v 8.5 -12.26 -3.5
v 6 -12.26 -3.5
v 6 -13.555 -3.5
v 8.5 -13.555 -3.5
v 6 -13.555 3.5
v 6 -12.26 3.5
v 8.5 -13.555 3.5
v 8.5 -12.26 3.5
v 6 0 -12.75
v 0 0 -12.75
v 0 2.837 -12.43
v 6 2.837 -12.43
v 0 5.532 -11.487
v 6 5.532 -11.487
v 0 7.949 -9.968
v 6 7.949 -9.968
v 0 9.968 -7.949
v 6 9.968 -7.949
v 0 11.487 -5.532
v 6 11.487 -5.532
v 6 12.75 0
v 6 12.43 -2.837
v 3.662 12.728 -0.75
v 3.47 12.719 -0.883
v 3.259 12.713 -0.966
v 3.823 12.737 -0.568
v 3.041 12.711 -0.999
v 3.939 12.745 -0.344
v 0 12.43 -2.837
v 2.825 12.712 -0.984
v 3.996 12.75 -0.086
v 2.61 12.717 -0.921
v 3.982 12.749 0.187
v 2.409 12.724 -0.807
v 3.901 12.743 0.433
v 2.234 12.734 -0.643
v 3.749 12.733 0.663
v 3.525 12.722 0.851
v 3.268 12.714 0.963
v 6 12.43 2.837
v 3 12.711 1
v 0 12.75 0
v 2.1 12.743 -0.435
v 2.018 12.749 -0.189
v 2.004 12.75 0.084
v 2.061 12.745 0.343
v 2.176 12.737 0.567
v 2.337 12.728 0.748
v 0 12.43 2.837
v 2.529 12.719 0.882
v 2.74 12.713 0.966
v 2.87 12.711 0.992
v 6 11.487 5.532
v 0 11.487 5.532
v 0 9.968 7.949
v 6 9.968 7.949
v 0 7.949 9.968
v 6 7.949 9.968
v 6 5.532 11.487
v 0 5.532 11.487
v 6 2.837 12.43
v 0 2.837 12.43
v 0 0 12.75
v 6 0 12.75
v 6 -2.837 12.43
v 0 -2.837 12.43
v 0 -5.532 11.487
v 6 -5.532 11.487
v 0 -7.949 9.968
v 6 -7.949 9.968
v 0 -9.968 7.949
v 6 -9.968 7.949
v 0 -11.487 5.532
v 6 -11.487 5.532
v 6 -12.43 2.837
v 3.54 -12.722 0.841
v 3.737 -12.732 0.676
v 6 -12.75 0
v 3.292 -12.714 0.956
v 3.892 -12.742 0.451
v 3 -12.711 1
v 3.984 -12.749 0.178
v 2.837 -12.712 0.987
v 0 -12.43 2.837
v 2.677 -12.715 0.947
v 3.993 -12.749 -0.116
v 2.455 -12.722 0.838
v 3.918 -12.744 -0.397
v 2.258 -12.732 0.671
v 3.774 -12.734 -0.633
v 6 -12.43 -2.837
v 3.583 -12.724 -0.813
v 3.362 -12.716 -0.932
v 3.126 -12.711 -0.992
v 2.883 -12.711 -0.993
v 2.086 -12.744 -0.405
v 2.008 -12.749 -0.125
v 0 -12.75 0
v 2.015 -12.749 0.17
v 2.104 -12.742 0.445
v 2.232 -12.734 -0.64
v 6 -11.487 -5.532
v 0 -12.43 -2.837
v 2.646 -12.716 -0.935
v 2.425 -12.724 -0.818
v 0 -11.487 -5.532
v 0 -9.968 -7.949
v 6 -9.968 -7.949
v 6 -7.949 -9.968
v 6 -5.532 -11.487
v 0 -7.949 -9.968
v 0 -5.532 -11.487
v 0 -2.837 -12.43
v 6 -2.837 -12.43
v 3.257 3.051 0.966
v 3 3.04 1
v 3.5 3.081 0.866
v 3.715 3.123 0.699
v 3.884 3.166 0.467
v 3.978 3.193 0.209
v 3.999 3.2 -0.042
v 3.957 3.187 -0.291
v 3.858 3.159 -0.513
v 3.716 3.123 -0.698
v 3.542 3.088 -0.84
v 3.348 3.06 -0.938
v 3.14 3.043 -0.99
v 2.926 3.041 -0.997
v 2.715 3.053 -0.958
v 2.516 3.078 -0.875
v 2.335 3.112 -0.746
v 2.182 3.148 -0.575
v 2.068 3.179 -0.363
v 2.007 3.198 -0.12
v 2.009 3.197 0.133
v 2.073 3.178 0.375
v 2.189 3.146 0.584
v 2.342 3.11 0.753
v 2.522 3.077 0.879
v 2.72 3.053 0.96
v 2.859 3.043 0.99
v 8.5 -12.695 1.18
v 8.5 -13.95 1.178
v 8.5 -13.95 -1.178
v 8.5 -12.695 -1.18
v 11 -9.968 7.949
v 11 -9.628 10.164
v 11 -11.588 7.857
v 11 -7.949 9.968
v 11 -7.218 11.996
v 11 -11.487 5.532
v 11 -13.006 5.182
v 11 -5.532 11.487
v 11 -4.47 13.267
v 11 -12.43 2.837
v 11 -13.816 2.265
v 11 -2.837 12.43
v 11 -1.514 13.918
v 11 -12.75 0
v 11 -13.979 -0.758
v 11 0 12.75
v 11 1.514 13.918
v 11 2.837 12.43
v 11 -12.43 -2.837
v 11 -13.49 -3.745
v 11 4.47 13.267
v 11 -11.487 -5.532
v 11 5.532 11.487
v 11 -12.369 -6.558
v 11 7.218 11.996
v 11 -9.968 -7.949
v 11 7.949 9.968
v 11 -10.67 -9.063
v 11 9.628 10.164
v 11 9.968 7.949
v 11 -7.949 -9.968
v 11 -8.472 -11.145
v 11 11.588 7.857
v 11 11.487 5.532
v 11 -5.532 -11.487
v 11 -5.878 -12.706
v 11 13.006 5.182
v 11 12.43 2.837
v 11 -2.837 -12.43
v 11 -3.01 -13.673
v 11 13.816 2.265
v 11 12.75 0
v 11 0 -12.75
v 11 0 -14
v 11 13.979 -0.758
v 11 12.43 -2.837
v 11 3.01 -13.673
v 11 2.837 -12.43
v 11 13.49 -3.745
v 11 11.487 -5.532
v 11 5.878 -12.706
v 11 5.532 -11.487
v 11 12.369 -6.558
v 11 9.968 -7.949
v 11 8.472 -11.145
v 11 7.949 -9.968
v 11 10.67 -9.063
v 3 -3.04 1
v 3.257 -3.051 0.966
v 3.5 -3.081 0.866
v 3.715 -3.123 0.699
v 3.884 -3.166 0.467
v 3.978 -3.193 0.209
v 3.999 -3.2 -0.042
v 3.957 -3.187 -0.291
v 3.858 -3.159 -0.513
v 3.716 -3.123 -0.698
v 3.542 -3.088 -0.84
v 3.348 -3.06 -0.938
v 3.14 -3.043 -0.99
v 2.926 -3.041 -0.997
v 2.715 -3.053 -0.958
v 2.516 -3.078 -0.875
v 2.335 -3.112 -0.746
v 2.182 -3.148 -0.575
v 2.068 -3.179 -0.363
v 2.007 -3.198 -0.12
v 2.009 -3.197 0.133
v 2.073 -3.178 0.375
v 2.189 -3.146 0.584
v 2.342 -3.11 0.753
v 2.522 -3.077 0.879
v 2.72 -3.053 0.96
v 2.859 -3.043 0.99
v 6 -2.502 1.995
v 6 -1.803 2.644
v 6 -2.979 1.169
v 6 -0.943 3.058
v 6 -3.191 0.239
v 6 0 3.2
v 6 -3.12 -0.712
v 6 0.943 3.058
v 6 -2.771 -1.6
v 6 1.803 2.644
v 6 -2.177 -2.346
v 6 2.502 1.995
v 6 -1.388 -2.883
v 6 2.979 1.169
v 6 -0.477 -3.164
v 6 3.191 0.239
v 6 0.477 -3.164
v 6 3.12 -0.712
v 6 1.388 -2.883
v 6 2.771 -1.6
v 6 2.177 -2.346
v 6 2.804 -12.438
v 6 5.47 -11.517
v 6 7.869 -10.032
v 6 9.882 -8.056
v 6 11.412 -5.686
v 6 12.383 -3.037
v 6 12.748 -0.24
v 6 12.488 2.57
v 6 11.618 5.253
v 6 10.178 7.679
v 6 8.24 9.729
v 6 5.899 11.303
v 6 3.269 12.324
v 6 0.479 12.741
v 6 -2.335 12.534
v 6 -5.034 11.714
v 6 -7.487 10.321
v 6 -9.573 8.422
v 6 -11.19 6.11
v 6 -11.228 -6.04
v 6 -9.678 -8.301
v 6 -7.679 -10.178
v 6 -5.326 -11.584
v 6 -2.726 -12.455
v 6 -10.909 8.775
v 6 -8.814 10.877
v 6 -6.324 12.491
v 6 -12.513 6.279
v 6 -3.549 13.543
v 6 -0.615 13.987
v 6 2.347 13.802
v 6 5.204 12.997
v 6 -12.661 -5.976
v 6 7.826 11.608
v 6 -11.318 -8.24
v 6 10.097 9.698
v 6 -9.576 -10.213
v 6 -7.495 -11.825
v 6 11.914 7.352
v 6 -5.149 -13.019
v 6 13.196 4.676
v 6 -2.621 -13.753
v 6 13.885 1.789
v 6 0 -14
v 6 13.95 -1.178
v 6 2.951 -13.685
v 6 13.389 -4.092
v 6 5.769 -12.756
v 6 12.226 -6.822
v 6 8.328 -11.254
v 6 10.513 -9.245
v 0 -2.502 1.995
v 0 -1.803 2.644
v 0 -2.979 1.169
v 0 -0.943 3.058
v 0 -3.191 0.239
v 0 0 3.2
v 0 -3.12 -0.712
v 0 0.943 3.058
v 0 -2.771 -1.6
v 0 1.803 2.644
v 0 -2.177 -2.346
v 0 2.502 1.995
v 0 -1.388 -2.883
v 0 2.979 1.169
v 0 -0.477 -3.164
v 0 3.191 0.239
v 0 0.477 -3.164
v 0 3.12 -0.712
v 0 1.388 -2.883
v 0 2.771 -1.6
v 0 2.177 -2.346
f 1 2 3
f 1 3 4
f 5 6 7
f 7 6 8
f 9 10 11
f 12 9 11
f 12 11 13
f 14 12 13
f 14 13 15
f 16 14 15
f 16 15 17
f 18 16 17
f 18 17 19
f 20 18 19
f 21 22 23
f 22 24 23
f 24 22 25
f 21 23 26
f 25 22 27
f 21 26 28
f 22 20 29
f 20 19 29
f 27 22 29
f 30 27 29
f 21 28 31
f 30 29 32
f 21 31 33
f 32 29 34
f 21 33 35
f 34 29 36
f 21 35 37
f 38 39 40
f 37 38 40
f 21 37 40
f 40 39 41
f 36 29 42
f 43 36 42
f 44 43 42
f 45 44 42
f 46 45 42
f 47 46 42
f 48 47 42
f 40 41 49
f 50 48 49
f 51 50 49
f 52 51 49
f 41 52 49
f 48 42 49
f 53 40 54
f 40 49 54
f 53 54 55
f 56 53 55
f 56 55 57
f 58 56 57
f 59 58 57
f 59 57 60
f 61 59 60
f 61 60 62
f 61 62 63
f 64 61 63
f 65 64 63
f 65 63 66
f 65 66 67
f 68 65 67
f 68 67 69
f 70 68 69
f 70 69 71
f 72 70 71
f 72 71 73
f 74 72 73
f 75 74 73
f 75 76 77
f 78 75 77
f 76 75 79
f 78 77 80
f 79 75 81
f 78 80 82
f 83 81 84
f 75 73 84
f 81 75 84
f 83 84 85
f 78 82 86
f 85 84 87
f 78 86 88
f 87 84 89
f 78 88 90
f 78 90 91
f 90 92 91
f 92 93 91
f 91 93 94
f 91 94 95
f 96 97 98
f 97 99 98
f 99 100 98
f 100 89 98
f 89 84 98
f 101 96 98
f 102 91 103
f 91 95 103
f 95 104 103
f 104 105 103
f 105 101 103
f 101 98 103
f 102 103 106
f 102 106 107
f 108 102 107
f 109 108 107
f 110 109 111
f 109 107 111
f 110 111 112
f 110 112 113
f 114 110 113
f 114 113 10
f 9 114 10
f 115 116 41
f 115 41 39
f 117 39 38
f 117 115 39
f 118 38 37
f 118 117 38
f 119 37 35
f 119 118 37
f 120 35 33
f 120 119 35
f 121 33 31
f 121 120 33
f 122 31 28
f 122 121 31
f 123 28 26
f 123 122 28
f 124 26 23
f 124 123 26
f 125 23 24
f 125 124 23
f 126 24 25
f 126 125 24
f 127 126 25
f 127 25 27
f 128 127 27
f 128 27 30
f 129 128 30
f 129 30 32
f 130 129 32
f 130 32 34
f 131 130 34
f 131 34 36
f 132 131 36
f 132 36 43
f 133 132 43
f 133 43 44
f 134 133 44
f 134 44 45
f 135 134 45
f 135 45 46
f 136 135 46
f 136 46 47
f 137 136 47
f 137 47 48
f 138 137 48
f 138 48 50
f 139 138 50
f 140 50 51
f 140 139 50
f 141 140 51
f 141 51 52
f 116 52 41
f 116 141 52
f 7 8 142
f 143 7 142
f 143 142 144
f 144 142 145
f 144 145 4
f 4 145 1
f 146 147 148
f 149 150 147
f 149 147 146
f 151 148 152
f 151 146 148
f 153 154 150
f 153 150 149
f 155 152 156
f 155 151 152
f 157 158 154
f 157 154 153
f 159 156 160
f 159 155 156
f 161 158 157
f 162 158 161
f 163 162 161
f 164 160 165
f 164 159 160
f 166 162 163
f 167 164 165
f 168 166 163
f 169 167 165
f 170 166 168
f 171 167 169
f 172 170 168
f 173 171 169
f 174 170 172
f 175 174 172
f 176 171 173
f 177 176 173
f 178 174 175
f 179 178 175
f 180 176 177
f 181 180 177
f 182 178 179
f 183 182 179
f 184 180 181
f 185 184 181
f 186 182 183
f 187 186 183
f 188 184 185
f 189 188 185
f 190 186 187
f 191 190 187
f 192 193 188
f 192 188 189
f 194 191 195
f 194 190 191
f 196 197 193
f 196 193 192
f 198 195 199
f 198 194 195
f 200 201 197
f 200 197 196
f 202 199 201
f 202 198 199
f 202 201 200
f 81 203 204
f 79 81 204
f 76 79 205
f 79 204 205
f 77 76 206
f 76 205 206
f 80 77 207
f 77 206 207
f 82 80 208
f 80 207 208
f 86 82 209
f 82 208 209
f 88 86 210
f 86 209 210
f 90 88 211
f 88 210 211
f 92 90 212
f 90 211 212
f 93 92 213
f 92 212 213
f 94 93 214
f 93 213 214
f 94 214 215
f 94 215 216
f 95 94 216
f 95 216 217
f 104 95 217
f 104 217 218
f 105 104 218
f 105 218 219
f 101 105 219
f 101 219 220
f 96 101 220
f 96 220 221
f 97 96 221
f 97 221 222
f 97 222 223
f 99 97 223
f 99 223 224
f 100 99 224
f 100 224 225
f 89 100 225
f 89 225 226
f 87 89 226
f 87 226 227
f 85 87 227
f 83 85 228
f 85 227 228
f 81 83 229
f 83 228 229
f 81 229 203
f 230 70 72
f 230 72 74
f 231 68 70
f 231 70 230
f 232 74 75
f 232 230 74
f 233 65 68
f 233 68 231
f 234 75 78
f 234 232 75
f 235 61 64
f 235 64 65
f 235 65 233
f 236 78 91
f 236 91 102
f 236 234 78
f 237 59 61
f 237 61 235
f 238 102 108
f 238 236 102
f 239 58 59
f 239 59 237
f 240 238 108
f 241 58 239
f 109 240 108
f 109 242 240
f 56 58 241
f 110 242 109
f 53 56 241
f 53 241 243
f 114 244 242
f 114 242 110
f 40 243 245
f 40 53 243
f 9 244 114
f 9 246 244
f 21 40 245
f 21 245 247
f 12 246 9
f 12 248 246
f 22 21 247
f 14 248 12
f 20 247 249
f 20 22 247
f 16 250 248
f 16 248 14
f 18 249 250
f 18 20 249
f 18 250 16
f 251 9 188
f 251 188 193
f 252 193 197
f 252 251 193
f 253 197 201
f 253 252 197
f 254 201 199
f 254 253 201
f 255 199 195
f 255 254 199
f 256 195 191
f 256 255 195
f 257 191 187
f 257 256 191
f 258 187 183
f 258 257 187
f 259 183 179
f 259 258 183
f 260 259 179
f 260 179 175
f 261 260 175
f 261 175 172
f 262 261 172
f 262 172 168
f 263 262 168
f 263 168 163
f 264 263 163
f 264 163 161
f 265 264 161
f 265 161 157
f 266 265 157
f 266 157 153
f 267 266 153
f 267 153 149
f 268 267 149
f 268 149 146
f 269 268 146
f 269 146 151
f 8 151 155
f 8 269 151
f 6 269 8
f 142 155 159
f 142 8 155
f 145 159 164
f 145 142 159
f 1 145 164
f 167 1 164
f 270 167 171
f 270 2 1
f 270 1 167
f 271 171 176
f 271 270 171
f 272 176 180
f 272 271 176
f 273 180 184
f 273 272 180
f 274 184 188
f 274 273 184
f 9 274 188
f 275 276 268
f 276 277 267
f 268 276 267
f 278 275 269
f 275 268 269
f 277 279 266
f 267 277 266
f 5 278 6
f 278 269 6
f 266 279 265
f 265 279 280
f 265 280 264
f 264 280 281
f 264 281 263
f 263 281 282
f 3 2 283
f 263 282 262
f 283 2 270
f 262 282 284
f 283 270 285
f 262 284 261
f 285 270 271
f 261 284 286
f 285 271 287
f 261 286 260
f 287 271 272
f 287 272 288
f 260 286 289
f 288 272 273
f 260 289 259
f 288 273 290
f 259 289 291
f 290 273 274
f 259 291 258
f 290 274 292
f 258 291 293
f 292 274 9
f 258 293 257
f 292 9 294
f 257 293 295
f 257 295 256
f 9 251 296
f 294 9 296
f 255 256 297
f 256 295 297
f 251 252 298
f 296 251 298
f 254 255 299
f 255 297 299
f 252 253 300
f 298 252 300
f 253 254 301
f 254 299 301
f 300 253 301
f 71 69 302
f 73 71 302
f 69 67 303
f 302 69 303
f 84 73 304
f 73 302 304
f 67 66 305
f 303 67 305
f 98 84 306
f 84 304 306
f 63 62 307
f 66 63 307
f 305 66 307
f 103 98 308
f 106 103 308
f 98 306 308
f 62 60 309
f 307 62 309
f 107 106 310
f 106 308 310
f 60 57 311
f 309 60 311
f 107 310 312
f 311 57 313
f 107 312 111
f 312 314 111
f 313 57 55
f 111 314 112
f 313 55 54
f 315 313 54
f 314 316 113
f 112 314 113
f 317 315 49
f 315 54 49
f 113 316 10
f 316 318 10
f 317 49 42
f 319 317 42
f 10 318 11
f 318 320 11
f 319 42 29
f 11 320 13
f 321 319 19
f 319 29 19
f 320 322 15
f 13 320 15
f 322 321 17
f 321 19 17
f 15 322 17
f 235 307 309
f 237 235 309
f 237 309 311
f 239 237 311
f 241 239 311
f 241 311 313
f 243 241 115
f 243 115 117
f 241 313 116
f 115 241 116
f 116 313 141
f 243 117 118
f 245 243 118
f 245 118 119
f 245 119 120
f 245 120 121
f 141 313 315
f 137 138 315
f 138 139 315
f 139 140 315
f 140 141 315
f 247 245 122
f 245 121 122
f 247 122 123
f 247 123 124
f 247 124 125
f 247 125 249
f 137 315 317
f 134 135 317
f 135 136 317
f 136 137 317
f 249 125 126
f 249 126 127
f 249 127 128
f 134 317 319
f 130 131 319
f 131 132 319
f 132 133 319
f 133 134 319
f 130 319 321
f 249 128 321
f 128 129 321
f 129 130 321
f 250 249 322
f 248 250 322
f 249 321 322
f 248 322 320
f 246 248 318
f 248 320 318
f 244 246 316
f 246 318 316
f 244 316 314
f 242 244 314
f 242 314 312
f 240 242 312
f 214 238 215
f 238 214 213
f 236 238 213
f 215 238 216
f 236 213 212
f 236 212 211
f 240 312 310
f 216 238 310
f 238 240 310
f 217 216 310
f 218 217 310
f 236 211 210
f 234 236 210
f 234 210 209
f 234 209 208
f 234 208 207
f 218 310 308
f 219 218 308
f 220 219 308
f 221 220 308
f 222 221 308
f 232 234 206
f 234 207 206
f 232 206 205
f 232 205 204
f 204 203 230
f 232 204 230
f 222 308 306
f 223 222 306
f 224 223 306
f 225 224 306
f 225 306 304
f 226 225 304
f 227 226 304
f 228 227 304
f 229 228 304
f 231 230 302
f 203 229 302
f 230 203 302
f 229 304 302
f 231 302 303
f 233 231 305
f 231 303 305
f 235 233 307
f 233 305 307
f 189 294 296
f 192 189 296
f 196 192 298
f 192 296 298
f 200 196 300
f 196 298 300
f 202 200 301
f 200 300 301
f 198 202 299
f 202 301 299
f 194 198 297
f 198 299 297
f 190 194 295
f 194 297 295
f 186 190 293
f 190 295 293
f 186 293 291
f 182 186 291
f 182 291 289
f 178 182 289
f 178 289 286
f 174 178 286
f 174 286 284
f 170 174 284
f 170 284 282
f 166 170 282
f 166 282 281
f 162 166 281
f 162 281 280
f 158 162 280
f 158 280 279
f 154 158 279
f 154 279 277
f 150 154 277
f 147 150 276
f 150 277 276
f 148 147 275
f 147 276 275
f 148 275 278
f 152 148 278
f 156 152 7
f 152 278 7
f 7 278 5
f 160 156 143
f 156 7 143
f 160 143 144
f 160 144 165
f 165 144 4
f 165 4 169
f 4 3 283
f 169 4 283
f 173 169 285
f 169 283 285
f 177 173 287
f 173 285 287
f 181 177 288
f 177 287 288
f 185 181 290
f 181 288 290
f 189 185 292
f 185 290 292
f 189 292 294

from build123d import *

# Parameters (mm, degrees)
SKETCH_1_R                      = 12.75
EXTRUDE_1_DEPTH                 = 6
SKETCH_2_R                      = 3.2
CUT_EXTRUDE_1_DEPTH             = 6
CUT_EXTRUDE_2_REACH             = 21.003
SKETCH_3_R                      = 1
CUT_EXTRUDE_2_DIRECTION_2_REACH = 21.003
SKETCH_4_R                      = 14
EXTRUDE_2_DEPTH                 = 5
CUT_EXTRUDE_START               = -5
SKETCH_5_R                      = 12.75
CUT_EXTRUDE_3_DEPTH             = 5
SKETCH_6_W                      = 2.5
SKETCH_6_H                      = 7
CUT_EXTRUDE_4_DEPTH             = 16


with BuildPart() as part:
    # 草图1 → 凸台-拉伸1 (new body)
    with BuildSketch(Plane(origin=(0, 0, 0), x_dir=(0, 0, -1), z_dir=(1, 0, 0))):
        Circle(SKETCH_1_R)
    extrude(amount=EXTRUDE_1_DEPTH)

    # 草图2 → 切除-拉伸1 (cut)
    with BuildSketch(Plane.ZY):
        Circle(SKETCH_2_R)
    extrude(amount=-CUT_EXTRUDE_1_DEPTH, mode=Mode.SUBTRACT)

    # 草图3 → 切除-拉伸2 (cut, up to next)
    with BuildSketch(Plane(origin=(0, 0, 0), x_dir=(1, 0, 0), z_dir=(0, 1, 0)), mode=Mode.PRIVATE) as cut_extrude_2_sk1:
        with Locations(Location((3, 0, 0), (0, 0, 270))):
            Circle(SKETCH_3_R)
    cut_extrude_2_tool1 = extrude(cut_extrude_2_sk1.sketch, amount=-CUT_EXTRUDE_2_REACH, mode=Mode.PRIVATE) & part.part
    add(cut_extrude_2_tool1.solids().sort_by_distance((3, 0, 0))[0], mode=Mode.SUBTRACT)

    # 草图3 → 切除-拉伸2 direction 2 (cut, up to next)
    with BuildSketch(Plane(origin=(0, 0, 0), x_dir=(1, 0, 0), z_dir=(0, 1, 0)), mode=Mode.PRIVATE) as cut_extrude_2_direction_2_sk1:
        with Locations(Location((3, 0, 0), (0, 0, 270))):
            Circle(SKETCH_3_R)
    cut_extrude_2_direction_2_tool1 = extrude(cut_extrude_2_direction_2_sk1.sketch, amount=CUT_EXTRUDE_2_DIRECTION_2_REACH, mode=Mode.PRIVATE) & part.part
    add(cut_extrude_2_direction_2_tool1.solids().sort_by_distance((3, 0, 0))[0], mode=Mode.SUBTRACT)

    # 草图4 → 凸台-拉伸2 (add)
    with BuildSketch(Plane(origin=(6, 0, 0), x_dir=(0, 0, -1), z_dir=(1, 0, 0))):
        Circle(SKETCH_4_R)
    extrude(amount=EXTRUDE_2_DEPTH)

    # 草图5 → 切除-拉伸3 (cut)
    with BuildSketch(Plane(origin=(11, 0, 0), x_dir=(0, 0, -1), z_dir=(1, 0, 0)).offset(CUT_EXTRUDE_START)):
        Circle(SKETCH_5_R)
    extrude(amount=CUT_EXTRUDE_3_DEPTH, mode=Mode.SUBTRACT)


with BuildPart() as cut_extrude_3_piece_1:
    # of the separate pieces the step leaves, piece 1, a body of its own (cut_extrude_3_pieces)
    add(part.part.solids().sort_by_distance((0, 0, -12.75))[0])


with BuildPart() as cut_extrude_3_piece_2:
    # of the separate pieces the step leaves, piece 2, a body of its own (cut_extrude_3_pieces)
    add(part.part.solids().sort_by_distance((6, 0, -14))[0])

    # 草图6 → 切除-拉伸4 (cut)
    with BuildSketch(Plane(origin=(0, 0, 0), x_dir=(1, 0, 0), z_dir=(0, 1, 0))):
        with Locations((7.25, 0)):
            Rectangle(SKETCH_6_W, SKETCH_6_H)
    extrude(amount=-CUT_EXTRUDE_4_DEPTH, mode=Mode.SUBTRACT)


solid = Compound([cut_extrude_3_piece_1.part, cut_extrude_3_piece_2.part])
